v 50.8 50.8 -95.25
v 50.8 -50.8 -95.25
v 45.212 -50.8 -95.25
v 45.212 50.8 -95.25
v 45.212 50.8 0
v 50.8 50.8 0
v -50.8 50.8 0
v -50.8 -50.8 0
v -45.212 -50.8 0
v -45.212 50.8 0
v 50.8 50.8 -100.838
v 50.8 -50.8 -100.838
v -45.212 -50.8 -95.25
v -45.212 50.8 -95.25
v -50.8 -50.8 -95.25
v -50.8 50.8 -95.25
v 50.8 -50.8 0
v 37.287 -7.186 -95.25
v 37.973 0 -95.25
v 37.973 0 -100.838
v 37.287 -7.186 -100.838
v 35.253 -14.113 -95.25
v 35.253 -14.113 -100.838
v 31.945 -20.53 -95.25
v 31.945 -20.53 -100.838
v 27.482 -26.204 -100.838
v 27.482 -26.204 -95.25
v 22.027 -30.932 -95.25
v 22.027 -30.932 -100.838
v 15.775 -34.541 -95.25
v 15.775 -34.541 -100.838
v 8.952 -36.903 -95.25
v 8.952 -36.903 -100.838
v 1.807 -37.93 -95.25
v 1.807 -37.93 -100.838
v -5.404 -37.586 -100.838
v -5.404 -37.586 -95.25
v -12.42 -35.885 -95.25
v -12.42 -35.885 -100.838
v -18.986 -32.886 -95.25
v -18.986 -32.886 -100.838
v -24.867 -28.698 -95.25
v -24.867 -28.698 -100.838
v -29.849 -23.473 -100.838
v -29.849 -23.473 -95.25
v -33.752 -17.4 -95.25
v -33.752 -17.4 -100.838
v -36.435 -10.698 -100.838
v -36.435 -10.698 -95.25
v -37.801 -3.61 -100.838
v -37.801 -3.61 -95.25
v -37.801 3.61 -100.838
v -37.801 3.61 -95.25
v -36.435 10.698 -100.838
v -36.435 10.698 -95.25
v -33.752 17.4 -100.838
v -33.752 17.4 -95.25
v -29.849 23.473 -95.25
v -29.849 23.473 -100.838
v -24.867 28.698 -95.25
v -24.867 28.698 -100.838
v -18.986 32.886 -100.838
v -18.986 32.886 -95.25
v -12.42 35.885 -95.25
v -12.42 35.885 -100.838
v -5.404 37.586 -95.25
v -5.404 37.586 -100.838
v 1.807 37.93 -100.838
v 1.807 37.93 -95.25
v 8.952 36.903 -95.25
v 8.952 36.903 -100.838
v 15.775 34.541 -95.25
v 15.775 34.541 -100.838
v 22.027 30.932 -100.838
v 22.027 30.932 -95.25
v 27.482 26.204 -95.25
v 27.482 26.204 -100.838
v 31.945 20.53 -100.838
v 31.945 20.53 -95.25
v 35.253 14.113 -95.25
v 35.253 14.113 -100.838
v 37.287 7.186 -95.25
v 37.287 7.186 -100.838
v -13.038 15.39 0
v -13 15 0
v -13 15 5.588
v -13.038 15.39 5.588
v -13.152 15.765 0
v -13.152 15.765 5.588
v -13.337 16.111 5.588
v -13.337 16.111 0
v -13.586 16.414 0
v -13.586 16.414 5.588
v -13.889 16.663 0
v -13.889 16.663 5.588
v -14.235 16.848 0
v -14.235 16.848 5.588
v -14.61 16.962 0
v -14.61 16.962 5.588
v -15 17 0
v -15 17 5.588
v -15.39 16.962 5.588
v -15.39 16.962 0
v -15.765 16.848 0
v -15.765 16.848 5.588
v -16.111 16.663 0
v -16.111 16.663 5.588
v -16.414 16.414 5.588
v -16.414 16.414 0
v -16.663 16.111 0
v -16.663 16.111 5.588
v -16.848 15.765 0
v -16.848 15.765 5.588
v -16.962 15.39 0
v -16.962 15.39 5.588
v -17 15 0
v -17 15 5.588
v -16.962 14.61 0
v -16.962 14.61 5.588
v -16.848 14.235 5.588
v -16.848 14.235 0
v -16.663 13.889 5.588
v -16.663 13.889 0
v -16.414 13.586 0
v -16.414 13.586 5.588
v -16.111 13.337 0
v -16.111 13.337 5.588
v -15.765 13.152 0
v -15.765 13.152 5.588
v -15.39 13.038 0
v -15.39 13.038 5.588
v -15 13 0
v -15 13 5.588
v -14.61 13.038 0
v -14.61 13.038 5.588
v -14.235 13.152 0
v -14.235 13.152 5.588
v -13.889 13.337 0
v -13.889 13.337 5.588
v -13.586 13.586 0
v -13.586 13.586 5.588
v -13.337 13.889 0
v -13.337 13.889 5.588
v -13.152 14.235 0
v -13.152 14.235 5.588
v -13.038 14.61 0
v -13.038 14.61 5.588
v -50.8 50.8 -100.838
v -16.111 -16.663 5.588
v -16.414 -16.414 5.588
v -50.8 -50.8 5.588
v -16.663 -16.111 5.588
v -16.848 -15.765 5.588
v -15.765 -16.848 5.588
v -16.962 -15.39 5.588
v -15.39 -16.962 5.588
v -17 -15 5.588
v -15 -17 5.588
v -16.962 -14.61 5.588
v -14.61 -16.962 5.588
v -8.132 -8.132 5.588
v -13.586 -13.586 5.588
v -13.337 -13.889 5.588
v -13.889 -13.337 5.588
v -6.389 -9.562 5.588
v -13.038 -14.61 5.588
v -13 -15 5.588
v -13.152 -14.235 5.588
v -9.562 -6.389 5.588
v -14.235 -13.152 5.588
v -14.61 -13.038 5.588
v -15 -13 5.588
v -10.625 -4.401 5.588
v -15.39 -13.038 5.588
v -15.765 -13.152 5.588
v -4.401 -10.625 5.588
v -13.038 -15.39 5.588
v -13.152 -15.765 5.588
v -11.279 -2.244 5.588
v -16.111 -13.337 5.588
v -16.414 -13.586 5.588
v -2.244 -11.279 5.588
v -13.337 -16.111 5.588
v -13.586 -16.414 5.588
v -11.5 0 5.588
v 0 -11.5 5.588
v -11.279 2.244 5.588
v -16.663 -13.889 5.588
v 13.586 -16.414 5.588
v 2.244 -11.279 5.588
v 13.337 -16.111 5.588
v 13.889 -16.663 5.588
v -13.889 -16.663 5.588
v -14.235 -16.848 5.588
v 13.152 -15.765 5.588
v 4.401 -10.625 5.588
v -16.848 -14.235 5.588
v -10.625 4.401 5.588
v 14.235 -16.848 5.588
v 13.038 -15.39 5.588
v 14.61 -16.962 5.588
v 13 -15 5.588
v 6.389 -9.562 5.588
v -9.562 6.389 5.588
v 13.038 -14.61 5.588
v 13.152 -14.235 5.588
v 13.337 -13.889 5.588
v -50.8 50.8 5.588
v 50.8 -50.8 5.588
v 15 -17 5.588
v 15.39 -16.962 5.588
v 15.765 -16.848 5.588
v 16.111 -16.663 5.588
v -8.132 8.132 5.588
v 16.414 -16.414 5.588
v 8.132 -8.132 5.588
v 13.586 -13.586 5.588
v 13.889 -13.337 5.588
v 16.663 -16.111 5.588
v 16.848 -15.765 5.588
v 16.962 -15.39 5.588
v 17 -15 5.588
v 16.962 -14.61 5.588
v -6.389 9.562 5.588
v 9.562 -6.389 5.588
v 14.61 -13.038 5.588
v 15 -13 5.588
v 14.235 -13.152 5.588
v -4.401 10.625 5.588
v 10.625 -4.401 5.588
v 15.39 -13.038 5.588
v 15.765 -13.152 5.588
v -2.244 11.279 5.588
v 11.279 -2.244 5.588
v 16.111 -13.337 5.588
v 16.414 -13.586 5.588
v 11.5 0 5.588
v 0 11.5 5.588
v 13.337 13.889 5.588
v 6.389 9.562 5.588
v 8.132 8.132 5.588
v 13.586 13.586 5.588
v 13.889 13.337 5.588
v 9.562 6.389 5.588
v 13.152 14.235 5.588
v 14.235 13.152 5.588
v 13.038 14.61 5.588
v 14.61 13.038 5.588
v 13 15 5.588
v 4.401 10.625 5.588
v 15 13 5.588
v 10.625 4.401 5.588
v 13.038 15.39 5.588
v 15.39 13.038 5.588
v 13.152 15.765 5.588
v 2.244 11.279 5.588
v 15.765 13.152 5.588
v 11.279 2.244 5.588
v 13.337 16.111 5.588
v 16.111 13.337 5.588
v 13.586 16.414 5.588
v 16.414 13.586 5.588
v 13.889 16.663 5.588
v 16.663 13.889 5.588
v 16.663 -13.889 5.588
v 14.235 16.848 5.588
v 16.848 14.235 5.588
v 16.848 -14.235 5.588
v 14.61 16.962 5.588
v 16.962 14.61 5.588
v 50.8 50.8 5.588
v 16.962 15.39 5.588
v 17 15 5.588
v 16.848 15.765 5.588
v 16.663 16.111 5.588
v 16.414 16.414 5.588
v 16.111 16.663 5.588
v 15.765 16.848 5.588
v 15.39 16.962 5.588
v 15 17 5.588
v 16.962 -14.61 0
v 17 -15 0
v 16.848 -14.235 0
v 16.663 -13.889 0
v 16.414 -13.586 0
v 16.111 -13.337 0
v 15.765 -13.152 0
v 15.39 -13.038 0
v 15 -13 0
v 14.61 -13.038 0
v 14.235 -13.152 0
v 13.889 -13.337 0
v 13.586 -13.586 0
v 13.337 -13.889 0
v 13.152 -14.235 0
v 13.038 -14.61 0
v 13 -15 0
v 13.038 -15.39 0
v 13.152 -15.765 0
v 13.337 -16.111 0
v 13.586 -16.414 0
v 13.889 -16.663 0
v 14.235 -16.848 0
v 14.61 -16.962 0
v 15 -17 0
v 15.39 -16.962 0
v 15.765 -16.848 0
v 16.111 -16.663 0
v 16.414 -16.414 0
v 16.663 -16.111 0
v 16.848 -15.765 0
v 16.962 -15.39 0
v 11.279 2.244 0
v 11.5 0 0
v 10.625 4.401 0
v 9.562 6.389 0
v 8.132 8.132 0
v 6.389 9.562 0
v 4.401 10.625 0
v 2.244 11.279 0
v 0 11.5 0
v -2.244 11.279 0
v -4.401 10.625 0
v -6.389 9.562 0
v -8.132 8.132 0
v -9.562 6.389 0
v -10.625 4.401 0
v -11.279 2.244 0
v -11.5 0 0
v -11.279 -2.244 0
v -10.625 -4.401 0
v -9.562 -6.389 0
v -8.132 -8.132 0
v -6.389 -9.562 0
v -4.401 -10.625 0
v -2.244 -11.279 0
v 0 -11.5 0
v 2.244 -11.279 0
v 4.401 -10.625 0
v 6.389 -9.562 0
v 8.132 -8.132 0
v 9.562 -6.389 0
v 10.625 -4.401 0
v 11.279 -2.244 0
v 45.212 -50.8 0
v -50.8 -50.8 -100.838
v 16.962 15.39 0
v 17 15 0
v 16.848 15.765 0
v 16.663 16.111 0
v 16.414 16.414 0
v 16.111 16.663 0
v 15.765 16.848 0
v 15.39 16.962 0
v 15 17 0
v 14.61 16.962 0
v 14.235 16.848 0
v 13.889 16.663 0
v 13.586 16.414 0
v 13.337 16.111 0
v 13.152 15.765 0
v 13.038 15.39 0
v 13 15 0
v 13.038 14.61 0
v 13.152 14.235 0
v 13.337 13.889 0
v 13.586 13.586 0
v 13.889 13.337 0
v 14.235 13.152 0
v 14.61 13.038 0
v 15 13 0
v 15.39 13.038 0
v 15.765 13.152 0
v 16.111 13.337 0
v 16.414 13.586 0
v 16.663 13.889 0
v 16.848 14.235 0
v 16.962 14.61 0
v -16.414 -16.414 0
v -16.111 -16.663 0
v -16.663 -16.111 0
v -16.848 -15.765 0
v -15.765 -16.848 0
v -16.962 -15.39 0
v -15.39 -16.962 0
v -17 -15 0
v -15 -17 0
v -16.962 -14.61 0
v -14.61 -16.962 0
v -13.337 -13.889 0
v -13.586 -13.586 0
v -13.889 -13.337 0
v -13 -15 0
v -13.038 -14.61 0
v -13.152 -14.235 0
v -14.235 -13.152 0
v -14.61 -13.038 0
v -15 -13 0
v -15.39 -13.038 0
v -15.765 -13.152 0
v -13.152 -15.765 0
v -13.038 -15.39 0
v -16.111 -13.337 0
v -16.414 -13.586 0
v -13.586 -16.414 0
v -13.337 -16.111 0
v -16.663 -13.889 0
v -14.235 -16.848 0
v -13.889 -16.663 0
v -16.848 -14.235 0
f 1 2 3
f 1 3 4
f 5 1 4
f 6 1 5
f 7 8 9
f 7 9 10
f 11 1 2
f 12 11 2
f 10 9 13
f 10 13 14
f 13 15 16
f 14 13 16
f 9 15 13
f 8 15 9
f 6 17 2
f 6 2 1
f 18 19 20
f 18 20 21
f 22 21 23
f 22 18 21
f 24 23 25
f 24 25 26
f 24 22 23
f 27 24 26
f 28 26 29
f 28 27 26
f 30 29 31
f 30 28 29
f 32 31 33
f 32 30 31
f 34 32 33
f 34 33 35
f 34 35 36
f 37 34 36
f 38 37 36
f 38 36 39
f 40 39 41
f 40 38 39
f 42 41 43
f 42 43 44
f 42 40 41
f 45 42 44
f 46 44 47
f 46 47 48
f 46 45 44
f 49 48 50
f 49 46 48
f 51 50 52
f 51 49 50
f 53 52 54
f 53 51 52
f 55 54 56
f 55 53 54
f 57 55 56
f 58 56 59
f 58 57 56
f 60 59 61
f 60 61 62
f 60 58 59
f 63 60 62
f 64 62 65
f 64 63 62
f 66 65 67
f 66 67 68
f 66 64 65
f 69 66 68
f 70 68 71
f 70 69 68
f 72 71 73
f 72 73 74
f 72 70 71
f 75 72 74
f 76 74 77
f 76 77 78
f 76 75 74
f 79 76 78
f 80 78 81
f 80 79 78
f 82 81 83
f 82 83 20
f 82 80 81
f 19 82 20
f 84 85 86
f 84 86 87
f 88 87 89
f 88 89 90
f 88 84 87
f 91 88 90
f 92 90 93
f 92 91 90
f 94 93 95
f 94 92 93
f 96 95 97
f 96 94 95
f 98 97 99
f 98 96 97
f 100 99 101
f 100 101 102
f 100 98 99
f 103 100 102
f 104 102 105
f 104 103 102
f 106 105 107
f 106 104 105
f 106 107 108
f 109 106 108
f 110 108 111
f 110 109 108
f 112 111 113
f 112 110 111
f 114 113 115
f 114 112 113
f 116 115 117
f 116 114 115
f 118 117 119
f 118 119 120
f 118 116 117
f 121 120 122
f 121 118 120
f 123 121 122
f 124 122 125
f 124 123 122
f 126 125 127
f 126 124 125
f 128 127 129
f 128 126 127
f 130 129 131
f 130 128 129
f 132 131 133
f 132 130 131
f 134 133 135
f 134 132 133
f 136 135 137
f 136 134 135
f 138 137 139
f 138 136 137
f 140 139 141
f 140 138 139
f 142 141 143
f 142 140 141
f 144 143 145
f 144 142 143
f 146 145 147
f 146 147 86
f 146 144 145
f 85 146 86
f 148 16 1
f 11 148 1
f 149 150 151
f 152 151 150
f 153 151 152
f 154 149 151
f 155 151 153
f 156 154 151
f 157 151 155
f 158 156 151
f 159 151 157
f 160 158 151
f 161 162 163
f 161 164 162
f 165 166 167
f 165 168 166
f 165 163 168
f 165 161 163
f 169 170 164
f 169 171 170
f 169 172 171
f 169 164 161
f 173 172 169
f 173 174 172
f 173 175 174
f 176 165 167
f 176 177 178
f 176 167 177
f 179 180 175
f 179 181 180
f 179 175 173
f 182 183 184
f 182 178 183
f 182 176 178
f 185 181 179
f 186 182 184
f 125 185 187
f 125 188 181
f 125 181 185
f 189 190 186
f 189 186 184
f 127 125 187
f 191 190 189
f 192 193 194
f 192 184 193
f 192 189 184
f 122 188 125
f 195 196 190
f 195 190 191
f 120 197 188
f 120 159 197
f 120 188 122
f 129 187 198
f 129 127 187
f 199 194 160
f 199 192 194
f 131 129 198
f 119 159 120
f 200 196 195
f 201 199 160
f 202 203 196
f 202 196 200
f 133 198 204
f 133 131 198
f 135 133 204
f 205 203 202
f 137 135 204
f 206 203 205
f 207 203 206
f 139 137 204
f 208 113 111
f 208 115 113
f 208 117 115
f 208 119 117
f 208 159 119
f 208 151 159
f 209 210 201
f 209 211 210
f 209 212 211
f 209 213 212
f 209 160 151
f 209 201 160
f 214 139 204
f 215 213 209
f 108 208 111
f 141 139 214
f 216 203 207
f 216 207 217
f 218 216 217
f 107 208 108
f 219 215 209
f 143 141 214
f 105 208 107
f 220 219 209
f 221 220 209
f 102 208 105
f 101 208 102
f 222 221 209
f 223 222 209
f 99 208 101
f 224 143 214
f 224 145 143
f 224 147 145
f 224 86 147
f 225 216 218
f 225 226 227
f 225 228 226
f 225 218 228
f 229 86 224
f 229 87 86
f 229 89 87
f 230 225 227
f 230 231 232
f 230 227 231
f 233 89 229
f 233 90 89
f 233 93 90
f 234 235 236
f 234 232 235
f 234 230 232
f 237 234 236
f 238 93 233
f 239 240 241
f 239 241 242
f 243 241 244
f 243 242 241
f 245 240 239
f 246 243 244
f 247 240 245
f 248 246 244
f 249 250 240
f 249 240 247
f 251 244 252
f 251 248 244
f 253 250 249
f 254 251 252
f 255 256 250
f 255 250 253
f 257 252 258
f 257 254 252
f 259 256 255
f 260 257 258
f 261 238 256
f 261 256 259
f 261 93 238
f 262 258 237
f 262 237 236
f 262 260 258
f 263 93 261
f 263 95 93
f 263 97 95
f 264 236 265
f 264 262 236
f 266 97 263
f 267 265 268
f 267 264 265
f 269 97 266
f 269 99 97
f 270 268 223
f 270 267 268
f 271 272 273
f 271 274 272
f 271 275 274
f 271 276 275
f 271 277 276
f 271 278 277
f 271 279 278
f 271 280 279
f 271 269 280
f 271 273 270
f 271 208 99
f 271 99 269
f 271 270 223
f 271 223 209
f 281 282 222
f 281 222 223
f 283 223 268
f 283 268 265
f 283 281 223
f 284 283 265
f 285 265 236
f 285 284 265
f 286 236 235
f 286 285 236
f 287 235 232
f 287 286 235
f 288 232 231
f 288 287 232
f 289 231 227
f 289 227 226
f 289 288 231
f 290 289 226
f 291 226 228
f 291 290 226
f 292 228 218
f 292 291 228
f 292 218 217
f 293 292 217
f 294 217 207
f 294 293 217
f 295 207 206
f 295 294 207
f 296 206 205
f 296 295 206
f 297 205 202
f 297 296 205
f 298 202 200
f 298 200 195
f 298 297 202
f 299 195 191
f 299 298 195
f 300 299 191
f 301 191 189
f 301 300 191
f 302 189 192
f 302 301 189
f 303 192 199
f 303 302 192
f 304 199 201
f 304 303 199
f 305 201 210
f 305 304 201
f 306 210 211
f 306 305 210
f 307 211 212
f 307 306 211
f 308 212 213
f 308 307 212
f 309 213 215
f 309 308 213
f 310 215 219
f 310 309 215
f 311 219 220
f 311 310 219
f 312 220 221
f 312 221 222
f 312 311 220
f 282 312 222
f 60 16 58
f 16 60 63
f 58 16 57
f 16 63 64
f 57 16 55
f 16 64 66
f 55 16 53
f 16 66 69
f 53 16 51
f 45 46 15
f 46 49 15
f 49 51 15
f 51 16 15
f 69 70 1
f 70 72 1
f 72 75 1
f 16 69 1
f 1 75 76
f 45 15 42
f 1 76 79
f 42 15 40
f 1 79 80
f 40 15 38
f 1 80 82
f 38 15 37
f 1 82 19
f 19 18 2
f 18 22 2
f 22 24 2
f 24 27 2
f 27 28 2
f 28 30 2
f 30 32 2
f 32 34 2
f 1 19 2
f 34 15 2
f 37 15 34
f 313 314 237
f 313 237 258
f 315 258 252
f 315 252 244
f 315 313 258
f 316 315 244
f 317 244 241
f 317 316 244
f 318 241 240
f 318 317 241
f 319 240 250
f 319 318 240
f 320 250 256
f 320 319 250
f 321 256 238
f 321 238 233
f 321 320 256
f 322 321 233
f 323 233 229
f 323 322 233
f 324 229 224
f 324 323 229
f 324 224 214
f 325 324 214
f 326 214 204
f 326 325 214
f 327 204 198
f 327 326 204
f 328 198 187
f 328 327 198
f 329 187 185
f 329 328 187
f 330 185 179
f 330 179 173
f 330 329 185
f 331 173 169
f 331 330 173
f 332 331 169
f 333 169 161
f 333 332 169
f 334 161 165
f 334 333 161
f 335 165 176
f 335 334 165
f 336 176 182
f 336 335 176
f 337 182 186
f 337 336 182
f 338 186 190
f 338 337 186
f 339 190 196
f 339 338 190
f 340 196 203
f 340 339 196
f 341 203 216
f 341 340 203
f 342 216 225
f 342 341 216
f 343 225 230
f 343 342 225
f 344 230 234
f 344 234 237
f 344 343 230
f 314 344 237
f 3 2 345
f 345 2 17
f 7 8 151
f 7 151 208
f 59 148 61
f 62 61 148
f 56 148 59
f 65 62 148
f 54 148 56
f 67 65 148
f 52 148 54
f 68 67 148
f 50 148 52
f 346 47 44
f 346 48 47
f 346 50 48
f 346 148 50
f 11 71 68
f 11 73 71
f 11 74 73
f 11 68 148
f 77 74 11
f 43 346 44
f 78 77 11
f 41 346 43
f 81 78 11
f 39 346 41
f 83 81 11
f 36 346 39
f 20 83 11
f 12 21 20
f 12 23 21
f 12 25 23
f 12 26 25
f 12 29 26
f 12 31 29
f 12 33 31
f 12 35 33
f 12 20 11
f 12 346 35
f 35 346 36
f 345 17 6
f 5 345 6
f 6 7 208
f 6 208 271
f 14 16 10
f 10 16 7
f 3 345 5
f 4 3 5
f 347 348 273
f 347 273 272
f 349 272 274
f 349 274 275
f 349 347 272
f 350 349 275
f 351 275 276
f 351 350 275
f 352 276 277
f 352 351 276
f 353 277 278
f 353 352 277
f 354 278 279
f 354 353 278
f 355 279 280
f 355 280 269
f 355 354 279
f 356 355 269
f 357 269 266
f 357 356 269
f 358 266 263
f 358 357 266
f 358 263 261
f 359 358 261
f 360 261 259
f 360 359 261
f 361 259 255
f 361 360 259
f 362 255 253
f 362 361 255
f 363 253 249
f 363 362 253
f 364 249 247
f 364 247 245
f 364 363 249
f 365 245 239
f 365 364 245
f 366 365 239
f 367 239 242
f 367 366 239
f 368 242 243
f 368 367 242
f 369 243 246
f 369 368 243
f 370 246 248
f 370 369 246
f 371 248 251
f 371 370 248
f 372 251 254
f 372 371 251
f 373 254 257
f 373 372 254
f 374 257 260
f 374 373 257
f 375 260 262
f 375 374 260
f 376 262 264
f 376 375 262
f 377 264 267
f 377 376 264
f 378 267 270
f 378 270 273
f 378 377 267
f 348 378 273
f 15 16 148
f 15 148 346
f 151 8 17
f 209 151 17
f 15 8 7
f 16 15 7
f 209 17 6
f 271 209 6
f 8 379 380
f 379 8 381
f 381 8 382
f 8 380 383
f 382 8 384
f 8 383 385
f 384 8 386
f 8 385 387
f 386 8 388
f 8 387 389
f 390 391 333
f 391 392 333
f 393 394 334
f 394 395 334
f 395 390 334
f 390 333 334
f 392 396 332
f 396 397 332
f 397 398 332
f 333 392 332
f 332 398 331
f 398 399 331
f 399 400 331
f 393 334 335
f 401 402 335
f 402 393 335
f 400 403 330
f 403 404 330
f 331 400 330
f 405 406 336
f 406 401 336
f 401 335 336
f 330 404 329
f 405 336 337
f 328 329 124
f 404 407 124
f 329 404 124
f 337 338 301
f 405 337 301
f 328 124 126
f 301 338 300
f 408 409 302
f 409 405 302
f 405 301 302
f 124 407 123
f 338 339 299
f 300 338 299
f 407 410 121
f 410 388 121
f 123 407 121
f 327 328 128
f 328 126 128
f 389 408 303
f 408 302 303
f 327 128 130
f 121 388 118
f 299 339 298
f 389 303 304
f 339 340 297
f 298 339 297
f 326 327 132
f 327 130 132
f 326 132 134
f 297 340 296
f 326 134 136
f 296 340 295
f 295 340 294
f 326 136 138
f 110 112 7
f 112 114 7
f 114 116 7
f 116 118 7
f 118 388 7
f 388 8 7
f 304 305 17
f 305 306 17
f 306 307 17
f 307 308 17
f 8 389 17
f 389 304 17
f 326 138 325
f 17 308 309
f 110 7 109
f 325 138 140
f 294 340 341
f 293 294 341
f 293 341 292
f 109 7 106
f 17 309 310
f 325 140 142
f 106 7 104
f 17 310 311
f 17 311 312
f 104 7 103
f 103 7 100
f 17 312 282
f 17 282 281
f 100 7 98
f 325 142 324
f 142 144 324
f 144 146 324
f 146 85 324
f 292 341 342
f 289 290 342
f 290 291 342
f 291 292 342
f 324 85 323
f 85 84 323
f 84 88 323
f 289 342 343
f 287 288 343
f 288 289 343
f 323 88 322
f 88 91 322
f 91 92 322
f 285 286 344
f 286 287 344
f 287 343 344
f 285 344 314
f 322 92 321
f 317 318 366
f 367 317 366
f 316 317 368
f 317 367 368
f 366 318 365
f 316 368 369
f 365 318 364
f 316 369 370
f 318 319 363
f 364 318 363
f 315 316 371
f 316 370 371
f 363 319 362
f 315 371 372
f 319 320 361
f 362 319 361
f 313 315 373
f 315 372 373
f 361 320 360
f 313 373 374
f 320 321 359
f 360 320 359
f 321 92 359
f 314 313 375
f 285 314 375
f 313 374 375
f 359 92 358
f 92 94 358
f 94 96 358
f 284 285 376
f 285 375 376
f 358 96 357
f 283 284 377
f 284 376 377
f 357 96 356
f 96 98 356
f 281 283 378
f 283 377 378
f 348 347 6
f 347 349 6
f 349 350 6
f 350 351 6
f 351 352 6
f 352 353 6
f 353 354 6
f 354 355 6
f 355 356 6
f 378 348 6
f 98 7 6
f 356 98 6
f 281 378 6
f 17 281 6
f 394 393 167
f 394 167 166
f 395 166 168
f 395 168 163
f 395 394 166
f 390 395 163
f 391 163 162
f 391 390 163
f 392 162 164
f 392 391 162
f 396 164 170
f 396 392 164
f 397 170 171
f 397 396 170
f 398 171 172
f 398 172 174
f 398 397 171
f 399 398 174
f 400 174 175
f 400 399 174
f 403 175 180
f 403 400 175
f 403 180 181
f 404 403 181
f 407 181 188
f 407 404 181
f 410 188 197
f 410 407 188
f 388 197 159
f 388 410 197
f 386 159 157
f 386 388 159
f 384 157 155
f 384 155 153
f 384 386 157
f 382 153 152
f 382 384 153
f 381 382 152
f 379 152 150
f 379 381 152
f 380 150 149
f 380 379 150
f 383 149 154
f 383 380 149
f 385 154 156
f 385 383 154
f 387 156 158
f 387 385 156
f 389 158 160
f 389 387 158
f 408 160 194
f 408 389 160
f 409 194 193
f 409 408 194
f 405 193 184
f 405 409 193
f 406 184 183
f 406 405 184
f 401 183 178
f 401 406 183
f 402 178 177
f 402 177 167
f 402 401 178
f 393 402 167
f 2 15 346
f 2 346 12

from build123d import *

# Parameters (mm, degrees)
F0_W     = 101.6
F0_H     = 101.6
F0_R     = 2
F0_R_2   = 11.5
F1_DEPTH = 5.588
F2_W     = 101.6
F2_H     = 95.25
F3_DEPTH = 5.588
F5_W     = 101.6
F5_H     = 101.6
F5_R     = 37.973
F6_DEPTH = 5.588


with BuildPart() as f1:
    # F0 (on Top) → F1 (new body)
    with BuildSketch(Plane.XY):
        Rectangle(F0_W, F0_H)
        with Locations((-15, -15)):
            Circle(F0_R, mode=Mode.SUBTRACT)
        Circle(F0_R_2, mode=Mode.SUBTRACT)
        with Locations((15, -15)):
            Circle(F0_R, mode=Mode.SUBTRACT)
        with Locations((-15, 15)):
            Circle(F0_R, mode=Mode.SUBTRACT)
        with Locations((15, 15)):
            Circle(F0_R, mode=Mode.SUBTRACT)
    extrude(amount=F1_DEPTH)


with BuildPart() as f3:
    # F2 (on face) → F3 (new body)
    with BuildSketch(Plane.YZ.offset(50.8)):
        with Locations((0, -47.625)):
            Rectangle(F2_W, F2_H)
    extrude(amount=-F3_DEPTH)


with BuildPart() as f4_1:
    # F4: instance of F3
    add(f3.part.mirror(Plane.YZ))


with BuildPart() as f6:
    # F5 (on face) → F6 (new body)
    with BuildSketch(Plane(origin=(0, 0, -95.25), x_dir=(1, 0, 0), z_dir=(0, 0, -1))):
        Rectangle(F5_W, F5_H)
        Circle(F5_R, mode=Mode.SUBTRACT)
    extrude(amount=F6_DEPTH)


solid = Compound([f1.part, f3.part, f4_1.part, f6.part])
